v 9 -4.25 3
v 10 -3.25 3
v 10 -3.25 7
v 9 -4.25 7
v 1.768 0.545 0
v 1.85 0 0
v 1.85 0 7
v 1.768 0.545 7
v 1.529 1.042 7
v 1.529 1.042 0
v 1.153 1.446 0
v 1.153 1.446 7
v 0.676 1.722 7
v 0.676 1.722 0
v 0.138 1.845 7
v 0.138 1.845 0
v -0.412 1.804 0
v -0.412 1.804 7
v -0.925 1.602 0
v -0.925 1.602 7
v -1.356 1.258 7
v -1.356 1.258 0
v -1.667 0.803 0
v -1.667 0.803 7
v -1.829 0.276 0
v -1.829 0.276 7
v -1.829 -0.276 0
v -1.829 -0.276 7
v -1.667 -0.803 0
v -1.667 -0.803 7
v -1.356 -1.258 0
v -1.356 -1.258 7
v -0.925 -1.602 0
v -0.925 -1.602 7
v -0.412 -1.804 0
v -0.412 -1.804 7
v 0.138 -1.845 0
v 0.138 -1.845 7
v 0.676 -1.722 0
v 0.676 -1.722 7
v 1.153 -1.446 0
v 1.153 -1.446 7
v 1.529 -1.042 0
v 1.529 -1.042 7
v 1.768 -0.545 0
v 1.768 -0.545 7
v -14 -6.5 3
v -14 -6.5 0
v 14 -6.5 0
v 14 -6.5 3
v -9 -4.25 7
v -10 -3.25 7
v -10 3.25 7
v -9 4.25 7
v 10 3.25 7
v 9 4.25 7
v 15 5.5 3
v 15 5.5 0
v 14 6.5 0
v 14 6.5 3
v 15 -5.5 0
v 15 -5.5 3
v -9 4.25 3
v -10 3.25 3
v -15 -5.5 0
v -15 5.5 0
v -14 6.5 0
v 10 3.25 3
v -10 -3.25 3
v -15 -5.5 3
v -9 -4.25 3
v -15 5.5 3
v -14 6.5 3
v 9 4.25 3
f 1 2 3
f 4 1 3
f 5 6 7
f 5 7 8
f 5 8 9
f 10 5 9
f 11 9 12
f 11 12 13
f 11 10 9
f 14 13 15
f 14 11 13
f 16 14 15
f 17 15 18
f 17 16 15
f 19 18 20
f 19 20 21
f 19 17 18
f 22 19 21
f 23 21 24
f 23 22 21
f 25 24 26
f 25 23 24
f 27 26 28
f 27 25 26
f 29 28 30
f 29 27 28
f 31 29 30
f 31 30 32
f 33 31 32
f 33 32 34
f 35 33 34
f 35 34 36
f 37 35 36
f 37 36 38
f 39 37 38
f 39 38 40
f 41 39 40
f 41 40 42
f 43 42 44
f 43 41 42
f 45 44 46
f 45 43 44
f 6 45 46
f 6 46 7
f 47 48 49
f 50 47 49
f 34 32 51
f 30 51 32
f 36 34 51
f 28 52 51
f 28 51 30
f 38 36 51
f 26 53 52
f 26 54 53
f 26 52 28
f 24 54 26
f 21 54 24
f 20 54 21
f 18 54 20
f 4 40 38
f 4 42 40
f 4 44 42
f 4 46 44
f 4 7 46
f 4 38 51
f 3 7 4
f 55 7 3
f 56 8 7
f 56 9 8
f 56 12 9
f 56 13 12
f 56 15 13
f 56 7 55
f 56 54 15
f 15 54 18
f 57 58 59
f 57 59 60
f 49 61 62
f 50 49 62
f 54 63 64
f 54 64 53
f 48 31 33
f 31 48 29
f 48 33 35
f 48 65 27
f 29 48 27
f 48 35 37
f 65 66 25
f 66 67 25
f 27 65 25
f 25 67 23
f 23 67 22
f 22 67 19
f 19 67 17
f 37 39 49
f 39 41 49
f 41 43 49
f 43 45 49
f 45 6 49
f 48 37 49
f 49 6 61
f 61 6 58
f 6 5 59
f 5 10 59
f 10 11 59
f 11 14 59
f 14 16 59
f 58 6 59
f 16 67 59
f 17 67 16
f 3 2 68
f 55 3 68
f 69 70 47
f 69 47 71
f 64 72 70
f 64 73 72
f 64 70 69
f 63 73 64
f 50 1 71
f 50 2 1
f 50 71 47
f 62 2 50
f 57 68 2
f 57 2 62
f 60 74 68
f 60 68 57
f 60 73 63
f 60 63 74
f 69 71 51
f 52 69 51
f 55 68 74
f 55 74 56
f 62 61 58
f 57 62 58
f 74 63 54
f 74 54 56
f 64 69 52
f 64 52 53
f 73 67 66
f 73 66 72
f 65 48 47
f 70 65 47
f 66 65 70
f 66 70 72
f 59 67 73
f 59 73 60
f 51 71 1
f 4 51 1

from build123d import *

# Parameters (mm, degrees)
F0_W     = 30
F0_H     = 13
F0_W_2   = 20
F0_H_2   = 8.5
F1_DEPTH = 3
F0_R     = 1.85
F2_DEPTH = 7
F3_SIZE  = 1


with BuildPart() as f1:
    # F0 (on Top) → F1 (new body)
    with BuildSketch(Plane.XY):
        Rectangle(F0_W, F0_H)
        Rectangle(F0_W_2, F0_H_2, mode=Mode.SUBTRACT)
    extrude(amount=F1_DEPTH)

    # F0 (on Top) → F2 (join)
    with BuildSketch(Plane.XY):
        Rectangle(F0_W_2, F0_H_2)
        Circle(F0_R, mode=Mode.SUBTRACT)
    extrude(amount=F2_DEPTH)

    # F3
    f3_edges = [f1.edges().sort_by_distance(p)[0] for p in [
        (-10, -4.25, 5),
        (10, -4.25, 5),
        (10, 4.25, 5),
        (-10, 4.25, 5),
        (-15, 6.5, 1.5),
        (15, 6.5, 1.5),
        (15, -6.5, 1.5),
        (-15, -6.5, 1.5),
    ]]
    chamfer(f3_edges, length=F3_SIZE)


solid = f1.part
